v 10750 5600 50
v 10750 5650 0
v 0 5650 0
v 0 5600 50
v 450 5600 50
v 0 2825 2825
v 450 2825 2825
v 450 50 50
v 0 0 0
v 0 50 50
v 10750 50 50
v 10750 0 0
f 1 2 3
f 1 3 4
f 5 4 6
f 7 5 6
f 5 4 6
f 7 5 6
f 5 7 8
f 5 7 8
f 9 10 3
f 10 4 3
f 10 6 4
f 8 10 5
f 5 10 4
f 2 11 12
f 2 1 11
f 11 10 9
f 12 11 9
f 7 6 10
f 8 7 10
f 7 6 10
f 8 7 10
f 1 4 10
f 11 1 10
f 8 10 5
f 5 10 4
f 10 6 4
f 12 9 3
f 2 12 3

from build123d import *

# Parameters (mm, degrees)
F1_DEPTH = 10750
F2_DEPTH = 450
F3_DEPTH = 450


with BuildPart() as f1:
    # F0 (on Right) → F1 (new body)
    with BuildSketch(Plane.YZ):
        Polygon((50, 50), (0, 0), (5650, 0), (5600, 50), align=None)
    extrude(amount=F1_DEPTH)


with BuildPart() as f2:
    # F0 (on Right) → F2 (new body)
    with BuildSketch(Plane.YZ):
        Polygon((2825, 2825), (50, 50), (5600, 50), align=None)
        Polygon((1700, 950), (2825, 2075), (3950, 950), align=None, mode=Mode.SUBTRACT)
        Polygon((3950, 950), (2825, 2075), (1700, 950), align=None)
    extrude(amount=F2_DEPTH)


with BuildPart() as f3:
    # F0 (on Right) → F3 (new body)
    with BuildSketch(Plane.YZ):
        Polygon((2825, 2825), (50, 50), (5600, 50), align=None)
        Polygon((1700, 950), (2825, 2075), (3950, 950), align=None, mode=Mode.SUBTRACT)
        Polygon((3950, 950), (2825, 2075), (1700, 950), align=None)
    extrude(amount=F3_DEPTH)


solid = Compound([f1.part, f2.part, f3.part])
